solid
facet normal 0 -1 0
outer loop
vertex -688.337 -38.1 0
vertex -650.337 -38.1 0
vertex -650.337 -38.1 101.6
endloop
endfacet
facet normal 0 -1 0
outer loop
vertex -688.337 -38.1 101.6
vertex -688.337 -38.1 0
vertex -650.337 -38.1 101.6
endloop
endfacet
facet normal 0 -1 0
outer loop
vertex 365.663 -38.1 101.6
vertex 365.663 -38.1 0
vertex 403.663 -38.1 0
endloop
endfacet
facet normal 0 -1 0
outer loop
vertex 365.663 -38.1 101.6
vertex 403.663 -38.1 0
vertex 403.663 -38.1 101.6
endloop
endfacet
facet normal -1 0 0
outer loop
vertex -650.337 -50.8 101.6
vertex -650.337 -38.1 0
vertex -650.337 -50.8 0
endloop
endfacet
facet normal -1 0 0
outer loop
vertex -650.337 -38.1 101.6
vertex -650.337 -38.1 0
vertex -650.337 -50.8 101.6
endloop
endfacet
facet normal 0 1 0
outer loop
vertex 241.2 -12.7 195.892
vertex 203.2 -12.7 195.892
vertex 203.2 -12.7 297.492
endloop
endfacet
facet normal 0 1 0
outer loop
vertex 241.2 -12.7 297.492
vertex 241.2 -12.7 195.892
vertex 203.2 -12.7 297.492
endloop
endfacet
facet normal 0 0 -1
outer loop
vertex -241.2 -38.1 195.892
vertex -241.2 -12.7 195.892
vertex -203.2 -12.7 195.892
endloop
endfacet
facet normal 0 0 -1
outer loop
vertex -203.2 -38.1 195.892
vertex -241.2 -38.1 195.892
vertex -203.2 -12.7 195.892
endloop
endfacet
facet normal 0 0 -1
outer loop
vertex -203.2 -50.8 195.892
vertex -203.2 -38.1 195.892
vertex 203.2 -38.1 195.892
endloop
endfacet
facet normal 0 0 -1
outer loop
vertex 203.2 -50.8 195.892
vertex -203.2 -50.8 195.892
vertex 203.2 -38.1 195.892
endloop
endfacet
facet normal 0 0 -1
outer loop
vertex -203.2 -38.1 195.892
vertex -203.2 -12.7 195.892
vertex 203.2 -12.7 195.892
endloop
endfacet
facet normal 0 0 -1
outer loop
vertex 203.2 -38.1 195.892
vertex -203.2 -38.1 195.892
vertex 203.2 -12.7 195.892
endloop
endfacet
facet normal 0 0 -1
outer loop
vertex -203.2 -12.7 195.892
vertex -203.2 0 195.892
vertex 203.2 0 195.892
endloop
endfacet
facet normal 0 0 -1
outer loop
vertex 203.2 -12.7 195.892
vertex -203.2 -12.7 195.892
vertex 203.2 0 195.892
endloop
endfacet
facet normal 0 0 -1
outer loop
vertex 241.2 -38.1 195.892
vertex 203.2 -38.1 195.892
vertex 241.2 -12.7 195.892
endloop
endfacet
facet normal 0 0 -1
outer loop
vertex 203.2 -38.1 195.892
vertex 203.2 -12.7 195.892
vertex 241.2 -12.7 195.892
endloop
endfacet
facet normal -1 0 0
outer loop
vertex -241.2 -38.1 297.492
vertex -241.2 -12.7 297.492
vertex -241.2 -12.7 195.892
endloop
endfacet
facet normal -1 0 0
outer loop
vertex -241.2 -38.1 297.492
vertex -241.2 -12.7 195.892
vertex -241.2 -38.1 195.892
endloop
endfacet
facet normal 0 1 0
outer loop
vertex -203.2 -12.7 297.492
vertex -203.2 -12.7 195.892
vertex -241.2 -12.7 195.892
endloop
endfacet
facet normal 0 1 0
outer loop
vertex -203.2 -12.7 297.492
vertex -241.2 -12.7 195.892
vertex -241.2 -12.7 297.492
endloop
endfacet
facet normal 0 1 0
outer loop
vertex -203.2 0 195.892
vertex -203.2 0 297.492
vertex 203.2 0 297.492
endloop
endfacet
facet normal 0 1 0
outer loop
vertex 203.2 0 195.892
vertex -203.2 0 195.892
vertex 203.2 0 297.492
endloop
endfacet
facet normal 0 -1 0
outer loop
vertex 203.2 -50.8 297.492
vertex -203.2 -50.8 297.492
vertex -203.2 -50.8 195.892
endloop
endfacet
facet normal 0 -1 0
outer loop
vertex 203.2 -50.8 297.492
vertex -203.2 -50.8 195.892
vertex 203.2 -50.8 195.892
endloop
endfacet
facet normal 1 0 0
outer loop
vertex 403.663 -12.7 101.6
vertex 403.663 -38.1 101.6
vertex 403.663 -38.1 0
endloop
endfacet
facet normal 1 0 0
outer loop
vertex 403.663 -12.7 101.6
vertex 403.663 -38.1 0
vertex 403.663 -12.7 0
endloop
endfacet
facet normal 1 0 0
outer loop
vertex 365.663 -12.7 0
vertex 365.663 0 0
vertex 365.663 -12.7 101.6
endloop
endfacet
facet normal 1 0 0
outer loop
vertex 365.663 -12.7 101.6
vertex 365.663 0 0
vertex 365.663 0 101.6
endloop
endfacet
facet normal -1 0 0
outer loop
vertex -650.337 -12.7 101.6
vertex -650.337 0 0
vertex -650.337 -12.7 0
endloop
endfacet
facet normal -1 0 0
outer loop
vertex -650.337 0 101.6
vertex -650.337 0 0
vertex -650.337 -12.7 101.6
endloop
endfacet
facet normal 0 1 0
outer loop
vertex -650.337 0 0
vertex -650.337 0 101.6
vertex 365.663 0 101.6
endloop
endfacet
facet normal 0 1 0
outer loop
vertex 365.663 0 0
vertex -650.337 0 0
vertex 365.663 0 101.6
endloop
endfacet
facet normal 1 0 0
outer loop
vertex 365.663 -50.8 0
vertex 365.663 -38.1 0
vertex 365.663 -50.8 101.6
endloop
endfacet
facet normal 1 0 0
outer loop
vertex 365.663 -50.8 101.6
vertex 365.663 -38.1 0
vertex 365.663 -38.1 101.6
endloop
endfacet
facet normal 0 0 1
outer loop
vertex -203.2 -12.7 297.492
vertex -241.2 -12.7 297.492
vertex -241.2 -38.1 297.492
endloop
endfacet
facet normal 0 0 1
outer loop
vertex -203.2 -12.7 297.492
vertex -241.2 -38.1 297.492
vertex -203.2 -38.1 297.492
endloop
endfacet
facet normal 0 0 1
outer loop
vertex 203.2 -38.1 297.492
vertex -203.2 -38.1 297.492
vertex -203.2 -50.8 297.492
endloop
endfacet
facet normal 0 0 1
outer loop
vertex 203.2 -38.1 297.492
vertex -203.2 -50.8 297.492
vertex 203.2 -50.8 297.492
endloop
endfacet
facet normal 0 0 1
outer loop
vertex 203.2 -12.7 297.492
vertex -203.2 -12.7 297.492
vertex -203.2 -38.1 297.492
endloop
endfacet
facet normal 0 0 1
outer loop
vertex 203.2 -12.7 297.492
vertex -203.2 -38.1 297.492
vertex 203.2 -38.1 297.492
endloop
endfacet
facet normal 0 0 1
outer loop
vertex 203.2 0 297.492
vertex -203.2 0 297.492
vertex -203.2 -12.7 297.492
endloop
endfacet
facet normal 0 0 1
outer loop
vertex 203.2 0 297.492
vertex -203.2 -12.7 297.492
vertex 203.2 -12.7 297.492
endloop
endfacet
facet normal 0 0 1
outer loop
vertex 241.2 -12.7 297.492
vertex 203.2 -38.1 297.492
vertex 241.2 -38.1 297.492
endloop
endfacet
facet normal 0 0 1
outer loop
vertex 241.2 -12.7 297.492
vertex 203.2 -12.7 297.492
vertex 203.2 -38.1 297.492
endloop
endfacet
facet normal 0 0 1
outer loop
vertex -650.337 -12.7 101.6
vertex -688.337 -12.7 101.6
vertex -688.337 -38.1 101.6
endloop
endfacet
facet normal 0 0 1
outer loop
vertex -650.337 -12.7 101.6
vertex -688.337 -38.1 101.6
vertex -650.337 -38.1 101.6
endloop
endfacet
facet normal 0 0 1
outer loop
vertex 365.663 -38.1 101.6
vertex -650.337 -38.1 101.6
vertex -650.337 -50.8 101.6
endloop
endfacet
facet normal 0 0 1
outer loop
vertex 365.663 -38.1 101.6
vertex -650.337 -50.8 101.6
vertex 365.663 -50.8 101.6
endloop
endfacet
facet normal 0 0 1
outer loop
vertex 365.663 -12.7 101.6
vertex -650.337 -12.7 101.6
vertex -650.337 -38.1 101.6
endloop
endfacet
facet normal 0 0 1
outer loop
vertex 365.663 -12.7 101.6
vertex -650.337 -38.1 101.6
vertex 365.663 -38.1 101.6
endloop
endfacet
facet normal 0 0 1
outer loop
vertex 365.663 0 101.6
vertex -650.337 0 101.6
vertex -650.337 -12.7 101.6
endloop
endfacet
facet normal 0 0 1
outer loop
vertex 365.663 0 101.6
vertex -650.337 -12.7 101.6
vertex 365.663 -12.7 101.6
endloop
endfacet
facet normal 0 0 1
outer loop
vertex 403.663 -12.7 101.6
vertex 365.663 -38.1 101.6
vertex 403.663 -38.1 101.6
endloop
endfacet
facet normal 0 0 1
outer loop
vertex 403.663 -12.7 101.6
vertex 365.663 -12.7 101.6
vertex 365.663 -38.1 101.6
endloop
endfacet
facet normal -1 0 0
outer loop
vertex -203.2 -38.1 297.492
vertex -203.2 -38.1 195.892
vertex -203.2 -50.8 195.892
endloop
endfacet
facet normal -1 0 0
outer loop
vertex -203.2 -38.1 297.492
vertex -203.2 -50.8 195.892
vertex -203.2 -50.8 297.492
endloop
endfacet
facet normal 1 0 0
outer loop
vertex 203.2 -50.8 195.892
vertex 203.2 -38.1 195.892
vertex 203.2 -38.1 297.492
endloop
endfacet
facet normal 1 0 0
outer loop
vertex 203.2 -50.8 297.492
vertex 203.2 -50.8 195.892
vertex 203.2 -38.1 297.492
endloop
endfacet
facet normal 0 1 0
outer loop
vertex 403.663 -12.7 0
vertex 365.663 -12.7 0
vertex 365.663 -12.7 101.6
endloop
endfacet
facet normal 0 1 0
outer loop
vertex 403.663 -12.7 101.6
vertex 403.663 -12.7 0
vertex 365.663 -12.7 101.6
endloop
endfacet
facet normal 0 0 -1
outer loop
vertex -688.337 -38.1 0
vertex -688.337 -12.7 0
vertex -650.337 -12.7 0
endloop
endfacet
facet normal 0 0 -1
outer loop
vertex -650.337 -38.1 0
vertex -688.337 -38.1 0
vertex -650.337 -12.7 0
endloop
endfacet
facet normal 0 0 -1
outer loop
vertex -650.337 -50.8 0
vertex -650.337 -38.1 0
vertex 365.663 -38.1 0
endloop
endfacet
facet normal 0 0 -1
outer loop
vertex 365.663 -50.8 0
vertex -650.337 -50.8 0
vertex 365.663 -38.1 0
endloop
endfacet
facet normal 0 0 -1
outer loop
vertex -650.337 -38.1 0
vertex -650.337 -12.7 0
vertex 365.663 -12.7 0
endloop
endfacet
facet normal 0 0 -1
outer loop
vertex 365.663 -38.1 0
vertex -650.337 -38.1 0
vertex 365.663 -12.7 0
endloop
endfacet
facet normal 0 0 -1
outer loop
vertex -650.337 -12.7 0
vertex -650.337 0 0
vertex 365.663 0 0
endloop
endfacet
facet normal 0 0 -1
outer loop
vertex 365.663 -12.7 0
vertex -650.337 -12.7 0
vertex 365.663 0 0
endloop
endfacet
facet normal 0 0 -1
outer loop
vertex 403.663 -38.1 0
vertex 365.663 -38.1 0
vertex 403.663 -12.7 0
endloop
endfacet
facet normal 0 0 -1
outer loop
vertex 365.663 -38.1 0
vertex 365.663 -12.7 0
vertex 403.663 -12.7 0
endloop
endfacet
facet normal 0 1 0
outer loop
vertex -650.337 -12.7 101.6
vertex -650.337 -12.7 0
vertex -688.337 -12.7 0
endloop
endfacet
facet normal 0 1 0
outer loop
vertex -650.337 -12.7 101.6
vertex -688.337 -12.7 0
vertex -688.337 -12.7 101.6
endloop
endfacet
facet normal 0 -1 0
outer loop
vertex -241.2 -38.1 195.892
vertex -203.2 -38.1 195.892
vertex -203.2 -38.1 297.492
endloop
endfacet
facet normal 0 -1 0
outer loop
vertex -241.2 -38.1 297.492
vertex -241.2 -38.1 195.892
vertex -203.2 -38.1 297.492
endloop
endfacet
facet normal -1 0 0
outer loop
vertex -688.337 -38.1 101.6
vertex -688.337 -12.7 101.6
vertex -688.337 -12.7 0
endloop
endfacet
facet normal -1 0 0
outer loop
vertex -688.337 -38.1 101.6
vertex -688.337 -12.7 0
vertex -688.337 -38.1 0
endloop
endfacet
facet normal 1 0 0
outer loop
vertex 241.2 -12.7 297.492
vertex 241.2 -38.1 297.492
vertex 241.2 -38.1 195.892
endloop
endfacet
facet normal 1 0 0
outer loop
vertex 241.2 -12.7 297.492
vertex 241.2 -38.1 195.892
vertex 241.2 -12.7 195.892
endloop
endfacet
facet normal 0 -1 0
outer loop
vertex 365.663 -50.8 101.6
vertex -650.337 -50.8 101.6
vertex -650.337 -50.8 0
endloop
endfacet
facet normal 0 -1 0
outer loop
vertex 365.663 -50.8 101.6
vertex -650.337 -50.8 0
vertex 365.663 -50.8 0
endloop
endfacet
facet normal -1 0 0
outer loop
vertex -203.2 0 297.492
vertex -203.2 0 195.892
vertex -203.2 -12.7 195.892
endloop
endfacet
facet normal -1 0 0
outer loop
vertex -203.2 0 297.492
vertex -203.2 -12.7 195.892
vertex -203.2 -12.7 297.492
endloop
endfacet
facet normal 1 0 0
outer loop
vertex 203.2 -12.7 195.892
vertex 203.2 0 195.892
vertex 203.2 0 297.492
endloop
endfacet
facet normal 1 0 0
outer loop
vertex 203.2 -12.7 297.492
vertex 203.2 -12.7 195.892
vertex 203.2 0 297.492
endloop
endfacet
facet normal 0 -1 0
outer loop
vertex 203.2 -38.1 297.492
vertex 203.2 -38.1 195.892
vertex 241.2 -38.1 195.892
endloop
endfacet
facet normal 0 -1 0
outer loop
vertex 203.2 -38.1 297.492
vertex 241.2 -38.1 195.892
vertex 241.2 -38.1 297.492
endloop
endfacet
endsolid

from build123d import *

# Parameters (mm, degrees)
F0_W     = 1016
F0_H     = 101.6
F0_W_2   = 406.4
F9_DEPTH = 50.8
F1_W     = 25.4
F1_H     = 101.6
F2_DEPTH = 38
F3_W     = 25.4
F3_H     = 101.6
F4_DEPTH = 38
F6_W     = 25.4
F6_H     = 101.6
F7_DEPTH = 38
F5_W     = 25.4
F5_H     = 101.6
F8_DEPTH = 38


with BuildPart() as f9:
    # F0 (on Front) → F9 (new body)
    with BuildSketch(Plane.XZ):
        with Locations((-142.337395, 50.8)):
            Rectangle(F0_W, F0_H)
        with Locations((0, 246.692121)):
            Rectangle(F0_W_2, F0_H)
    extrude(amount=F9_DEPTH)

    # F1 (on face) → F2 (join)
    with BuildSketch(Plane.YZ.offset(365.662605)):
        with Locations((-25.4, 50.8)):
            Rectangle(F1_W, F1_H)
    extrude(amount=F2_DEPTH)

    # F3 (on face) → F4 (join)
    with BuildSketch(Plane(origin=(-650.337395, 0, 0), x_dir=(0, -1, 0), z_dir=(-1, 0, 0))):
        with Locations((25.4, 50.8)):
            Rectangle(F3_W, F3_H)
    extrude(amount=F4_DEPTH)

    # F6 (on face) → F7 (join)
    with BuildSketch(Plane(origin=(-203.2, 0, 0), x_dir=(0, -1, 0), z_dir=(-1, 0, 0))):
        with Locations((25.4, 246.692121)):
            Rectangle(F6_W, F6_H)
    extrude(amount=F7_DEPTH)

    # F5 (on face) → F8 (join)
    with BuildSketch(Plane.YZ.offset(203.2)):
        with Locations((-25.4, 246.692121)):
            Rectangle(F5_W, F5_H)
    extrude(amount=F8_DEPTH)


solid = f9.part
